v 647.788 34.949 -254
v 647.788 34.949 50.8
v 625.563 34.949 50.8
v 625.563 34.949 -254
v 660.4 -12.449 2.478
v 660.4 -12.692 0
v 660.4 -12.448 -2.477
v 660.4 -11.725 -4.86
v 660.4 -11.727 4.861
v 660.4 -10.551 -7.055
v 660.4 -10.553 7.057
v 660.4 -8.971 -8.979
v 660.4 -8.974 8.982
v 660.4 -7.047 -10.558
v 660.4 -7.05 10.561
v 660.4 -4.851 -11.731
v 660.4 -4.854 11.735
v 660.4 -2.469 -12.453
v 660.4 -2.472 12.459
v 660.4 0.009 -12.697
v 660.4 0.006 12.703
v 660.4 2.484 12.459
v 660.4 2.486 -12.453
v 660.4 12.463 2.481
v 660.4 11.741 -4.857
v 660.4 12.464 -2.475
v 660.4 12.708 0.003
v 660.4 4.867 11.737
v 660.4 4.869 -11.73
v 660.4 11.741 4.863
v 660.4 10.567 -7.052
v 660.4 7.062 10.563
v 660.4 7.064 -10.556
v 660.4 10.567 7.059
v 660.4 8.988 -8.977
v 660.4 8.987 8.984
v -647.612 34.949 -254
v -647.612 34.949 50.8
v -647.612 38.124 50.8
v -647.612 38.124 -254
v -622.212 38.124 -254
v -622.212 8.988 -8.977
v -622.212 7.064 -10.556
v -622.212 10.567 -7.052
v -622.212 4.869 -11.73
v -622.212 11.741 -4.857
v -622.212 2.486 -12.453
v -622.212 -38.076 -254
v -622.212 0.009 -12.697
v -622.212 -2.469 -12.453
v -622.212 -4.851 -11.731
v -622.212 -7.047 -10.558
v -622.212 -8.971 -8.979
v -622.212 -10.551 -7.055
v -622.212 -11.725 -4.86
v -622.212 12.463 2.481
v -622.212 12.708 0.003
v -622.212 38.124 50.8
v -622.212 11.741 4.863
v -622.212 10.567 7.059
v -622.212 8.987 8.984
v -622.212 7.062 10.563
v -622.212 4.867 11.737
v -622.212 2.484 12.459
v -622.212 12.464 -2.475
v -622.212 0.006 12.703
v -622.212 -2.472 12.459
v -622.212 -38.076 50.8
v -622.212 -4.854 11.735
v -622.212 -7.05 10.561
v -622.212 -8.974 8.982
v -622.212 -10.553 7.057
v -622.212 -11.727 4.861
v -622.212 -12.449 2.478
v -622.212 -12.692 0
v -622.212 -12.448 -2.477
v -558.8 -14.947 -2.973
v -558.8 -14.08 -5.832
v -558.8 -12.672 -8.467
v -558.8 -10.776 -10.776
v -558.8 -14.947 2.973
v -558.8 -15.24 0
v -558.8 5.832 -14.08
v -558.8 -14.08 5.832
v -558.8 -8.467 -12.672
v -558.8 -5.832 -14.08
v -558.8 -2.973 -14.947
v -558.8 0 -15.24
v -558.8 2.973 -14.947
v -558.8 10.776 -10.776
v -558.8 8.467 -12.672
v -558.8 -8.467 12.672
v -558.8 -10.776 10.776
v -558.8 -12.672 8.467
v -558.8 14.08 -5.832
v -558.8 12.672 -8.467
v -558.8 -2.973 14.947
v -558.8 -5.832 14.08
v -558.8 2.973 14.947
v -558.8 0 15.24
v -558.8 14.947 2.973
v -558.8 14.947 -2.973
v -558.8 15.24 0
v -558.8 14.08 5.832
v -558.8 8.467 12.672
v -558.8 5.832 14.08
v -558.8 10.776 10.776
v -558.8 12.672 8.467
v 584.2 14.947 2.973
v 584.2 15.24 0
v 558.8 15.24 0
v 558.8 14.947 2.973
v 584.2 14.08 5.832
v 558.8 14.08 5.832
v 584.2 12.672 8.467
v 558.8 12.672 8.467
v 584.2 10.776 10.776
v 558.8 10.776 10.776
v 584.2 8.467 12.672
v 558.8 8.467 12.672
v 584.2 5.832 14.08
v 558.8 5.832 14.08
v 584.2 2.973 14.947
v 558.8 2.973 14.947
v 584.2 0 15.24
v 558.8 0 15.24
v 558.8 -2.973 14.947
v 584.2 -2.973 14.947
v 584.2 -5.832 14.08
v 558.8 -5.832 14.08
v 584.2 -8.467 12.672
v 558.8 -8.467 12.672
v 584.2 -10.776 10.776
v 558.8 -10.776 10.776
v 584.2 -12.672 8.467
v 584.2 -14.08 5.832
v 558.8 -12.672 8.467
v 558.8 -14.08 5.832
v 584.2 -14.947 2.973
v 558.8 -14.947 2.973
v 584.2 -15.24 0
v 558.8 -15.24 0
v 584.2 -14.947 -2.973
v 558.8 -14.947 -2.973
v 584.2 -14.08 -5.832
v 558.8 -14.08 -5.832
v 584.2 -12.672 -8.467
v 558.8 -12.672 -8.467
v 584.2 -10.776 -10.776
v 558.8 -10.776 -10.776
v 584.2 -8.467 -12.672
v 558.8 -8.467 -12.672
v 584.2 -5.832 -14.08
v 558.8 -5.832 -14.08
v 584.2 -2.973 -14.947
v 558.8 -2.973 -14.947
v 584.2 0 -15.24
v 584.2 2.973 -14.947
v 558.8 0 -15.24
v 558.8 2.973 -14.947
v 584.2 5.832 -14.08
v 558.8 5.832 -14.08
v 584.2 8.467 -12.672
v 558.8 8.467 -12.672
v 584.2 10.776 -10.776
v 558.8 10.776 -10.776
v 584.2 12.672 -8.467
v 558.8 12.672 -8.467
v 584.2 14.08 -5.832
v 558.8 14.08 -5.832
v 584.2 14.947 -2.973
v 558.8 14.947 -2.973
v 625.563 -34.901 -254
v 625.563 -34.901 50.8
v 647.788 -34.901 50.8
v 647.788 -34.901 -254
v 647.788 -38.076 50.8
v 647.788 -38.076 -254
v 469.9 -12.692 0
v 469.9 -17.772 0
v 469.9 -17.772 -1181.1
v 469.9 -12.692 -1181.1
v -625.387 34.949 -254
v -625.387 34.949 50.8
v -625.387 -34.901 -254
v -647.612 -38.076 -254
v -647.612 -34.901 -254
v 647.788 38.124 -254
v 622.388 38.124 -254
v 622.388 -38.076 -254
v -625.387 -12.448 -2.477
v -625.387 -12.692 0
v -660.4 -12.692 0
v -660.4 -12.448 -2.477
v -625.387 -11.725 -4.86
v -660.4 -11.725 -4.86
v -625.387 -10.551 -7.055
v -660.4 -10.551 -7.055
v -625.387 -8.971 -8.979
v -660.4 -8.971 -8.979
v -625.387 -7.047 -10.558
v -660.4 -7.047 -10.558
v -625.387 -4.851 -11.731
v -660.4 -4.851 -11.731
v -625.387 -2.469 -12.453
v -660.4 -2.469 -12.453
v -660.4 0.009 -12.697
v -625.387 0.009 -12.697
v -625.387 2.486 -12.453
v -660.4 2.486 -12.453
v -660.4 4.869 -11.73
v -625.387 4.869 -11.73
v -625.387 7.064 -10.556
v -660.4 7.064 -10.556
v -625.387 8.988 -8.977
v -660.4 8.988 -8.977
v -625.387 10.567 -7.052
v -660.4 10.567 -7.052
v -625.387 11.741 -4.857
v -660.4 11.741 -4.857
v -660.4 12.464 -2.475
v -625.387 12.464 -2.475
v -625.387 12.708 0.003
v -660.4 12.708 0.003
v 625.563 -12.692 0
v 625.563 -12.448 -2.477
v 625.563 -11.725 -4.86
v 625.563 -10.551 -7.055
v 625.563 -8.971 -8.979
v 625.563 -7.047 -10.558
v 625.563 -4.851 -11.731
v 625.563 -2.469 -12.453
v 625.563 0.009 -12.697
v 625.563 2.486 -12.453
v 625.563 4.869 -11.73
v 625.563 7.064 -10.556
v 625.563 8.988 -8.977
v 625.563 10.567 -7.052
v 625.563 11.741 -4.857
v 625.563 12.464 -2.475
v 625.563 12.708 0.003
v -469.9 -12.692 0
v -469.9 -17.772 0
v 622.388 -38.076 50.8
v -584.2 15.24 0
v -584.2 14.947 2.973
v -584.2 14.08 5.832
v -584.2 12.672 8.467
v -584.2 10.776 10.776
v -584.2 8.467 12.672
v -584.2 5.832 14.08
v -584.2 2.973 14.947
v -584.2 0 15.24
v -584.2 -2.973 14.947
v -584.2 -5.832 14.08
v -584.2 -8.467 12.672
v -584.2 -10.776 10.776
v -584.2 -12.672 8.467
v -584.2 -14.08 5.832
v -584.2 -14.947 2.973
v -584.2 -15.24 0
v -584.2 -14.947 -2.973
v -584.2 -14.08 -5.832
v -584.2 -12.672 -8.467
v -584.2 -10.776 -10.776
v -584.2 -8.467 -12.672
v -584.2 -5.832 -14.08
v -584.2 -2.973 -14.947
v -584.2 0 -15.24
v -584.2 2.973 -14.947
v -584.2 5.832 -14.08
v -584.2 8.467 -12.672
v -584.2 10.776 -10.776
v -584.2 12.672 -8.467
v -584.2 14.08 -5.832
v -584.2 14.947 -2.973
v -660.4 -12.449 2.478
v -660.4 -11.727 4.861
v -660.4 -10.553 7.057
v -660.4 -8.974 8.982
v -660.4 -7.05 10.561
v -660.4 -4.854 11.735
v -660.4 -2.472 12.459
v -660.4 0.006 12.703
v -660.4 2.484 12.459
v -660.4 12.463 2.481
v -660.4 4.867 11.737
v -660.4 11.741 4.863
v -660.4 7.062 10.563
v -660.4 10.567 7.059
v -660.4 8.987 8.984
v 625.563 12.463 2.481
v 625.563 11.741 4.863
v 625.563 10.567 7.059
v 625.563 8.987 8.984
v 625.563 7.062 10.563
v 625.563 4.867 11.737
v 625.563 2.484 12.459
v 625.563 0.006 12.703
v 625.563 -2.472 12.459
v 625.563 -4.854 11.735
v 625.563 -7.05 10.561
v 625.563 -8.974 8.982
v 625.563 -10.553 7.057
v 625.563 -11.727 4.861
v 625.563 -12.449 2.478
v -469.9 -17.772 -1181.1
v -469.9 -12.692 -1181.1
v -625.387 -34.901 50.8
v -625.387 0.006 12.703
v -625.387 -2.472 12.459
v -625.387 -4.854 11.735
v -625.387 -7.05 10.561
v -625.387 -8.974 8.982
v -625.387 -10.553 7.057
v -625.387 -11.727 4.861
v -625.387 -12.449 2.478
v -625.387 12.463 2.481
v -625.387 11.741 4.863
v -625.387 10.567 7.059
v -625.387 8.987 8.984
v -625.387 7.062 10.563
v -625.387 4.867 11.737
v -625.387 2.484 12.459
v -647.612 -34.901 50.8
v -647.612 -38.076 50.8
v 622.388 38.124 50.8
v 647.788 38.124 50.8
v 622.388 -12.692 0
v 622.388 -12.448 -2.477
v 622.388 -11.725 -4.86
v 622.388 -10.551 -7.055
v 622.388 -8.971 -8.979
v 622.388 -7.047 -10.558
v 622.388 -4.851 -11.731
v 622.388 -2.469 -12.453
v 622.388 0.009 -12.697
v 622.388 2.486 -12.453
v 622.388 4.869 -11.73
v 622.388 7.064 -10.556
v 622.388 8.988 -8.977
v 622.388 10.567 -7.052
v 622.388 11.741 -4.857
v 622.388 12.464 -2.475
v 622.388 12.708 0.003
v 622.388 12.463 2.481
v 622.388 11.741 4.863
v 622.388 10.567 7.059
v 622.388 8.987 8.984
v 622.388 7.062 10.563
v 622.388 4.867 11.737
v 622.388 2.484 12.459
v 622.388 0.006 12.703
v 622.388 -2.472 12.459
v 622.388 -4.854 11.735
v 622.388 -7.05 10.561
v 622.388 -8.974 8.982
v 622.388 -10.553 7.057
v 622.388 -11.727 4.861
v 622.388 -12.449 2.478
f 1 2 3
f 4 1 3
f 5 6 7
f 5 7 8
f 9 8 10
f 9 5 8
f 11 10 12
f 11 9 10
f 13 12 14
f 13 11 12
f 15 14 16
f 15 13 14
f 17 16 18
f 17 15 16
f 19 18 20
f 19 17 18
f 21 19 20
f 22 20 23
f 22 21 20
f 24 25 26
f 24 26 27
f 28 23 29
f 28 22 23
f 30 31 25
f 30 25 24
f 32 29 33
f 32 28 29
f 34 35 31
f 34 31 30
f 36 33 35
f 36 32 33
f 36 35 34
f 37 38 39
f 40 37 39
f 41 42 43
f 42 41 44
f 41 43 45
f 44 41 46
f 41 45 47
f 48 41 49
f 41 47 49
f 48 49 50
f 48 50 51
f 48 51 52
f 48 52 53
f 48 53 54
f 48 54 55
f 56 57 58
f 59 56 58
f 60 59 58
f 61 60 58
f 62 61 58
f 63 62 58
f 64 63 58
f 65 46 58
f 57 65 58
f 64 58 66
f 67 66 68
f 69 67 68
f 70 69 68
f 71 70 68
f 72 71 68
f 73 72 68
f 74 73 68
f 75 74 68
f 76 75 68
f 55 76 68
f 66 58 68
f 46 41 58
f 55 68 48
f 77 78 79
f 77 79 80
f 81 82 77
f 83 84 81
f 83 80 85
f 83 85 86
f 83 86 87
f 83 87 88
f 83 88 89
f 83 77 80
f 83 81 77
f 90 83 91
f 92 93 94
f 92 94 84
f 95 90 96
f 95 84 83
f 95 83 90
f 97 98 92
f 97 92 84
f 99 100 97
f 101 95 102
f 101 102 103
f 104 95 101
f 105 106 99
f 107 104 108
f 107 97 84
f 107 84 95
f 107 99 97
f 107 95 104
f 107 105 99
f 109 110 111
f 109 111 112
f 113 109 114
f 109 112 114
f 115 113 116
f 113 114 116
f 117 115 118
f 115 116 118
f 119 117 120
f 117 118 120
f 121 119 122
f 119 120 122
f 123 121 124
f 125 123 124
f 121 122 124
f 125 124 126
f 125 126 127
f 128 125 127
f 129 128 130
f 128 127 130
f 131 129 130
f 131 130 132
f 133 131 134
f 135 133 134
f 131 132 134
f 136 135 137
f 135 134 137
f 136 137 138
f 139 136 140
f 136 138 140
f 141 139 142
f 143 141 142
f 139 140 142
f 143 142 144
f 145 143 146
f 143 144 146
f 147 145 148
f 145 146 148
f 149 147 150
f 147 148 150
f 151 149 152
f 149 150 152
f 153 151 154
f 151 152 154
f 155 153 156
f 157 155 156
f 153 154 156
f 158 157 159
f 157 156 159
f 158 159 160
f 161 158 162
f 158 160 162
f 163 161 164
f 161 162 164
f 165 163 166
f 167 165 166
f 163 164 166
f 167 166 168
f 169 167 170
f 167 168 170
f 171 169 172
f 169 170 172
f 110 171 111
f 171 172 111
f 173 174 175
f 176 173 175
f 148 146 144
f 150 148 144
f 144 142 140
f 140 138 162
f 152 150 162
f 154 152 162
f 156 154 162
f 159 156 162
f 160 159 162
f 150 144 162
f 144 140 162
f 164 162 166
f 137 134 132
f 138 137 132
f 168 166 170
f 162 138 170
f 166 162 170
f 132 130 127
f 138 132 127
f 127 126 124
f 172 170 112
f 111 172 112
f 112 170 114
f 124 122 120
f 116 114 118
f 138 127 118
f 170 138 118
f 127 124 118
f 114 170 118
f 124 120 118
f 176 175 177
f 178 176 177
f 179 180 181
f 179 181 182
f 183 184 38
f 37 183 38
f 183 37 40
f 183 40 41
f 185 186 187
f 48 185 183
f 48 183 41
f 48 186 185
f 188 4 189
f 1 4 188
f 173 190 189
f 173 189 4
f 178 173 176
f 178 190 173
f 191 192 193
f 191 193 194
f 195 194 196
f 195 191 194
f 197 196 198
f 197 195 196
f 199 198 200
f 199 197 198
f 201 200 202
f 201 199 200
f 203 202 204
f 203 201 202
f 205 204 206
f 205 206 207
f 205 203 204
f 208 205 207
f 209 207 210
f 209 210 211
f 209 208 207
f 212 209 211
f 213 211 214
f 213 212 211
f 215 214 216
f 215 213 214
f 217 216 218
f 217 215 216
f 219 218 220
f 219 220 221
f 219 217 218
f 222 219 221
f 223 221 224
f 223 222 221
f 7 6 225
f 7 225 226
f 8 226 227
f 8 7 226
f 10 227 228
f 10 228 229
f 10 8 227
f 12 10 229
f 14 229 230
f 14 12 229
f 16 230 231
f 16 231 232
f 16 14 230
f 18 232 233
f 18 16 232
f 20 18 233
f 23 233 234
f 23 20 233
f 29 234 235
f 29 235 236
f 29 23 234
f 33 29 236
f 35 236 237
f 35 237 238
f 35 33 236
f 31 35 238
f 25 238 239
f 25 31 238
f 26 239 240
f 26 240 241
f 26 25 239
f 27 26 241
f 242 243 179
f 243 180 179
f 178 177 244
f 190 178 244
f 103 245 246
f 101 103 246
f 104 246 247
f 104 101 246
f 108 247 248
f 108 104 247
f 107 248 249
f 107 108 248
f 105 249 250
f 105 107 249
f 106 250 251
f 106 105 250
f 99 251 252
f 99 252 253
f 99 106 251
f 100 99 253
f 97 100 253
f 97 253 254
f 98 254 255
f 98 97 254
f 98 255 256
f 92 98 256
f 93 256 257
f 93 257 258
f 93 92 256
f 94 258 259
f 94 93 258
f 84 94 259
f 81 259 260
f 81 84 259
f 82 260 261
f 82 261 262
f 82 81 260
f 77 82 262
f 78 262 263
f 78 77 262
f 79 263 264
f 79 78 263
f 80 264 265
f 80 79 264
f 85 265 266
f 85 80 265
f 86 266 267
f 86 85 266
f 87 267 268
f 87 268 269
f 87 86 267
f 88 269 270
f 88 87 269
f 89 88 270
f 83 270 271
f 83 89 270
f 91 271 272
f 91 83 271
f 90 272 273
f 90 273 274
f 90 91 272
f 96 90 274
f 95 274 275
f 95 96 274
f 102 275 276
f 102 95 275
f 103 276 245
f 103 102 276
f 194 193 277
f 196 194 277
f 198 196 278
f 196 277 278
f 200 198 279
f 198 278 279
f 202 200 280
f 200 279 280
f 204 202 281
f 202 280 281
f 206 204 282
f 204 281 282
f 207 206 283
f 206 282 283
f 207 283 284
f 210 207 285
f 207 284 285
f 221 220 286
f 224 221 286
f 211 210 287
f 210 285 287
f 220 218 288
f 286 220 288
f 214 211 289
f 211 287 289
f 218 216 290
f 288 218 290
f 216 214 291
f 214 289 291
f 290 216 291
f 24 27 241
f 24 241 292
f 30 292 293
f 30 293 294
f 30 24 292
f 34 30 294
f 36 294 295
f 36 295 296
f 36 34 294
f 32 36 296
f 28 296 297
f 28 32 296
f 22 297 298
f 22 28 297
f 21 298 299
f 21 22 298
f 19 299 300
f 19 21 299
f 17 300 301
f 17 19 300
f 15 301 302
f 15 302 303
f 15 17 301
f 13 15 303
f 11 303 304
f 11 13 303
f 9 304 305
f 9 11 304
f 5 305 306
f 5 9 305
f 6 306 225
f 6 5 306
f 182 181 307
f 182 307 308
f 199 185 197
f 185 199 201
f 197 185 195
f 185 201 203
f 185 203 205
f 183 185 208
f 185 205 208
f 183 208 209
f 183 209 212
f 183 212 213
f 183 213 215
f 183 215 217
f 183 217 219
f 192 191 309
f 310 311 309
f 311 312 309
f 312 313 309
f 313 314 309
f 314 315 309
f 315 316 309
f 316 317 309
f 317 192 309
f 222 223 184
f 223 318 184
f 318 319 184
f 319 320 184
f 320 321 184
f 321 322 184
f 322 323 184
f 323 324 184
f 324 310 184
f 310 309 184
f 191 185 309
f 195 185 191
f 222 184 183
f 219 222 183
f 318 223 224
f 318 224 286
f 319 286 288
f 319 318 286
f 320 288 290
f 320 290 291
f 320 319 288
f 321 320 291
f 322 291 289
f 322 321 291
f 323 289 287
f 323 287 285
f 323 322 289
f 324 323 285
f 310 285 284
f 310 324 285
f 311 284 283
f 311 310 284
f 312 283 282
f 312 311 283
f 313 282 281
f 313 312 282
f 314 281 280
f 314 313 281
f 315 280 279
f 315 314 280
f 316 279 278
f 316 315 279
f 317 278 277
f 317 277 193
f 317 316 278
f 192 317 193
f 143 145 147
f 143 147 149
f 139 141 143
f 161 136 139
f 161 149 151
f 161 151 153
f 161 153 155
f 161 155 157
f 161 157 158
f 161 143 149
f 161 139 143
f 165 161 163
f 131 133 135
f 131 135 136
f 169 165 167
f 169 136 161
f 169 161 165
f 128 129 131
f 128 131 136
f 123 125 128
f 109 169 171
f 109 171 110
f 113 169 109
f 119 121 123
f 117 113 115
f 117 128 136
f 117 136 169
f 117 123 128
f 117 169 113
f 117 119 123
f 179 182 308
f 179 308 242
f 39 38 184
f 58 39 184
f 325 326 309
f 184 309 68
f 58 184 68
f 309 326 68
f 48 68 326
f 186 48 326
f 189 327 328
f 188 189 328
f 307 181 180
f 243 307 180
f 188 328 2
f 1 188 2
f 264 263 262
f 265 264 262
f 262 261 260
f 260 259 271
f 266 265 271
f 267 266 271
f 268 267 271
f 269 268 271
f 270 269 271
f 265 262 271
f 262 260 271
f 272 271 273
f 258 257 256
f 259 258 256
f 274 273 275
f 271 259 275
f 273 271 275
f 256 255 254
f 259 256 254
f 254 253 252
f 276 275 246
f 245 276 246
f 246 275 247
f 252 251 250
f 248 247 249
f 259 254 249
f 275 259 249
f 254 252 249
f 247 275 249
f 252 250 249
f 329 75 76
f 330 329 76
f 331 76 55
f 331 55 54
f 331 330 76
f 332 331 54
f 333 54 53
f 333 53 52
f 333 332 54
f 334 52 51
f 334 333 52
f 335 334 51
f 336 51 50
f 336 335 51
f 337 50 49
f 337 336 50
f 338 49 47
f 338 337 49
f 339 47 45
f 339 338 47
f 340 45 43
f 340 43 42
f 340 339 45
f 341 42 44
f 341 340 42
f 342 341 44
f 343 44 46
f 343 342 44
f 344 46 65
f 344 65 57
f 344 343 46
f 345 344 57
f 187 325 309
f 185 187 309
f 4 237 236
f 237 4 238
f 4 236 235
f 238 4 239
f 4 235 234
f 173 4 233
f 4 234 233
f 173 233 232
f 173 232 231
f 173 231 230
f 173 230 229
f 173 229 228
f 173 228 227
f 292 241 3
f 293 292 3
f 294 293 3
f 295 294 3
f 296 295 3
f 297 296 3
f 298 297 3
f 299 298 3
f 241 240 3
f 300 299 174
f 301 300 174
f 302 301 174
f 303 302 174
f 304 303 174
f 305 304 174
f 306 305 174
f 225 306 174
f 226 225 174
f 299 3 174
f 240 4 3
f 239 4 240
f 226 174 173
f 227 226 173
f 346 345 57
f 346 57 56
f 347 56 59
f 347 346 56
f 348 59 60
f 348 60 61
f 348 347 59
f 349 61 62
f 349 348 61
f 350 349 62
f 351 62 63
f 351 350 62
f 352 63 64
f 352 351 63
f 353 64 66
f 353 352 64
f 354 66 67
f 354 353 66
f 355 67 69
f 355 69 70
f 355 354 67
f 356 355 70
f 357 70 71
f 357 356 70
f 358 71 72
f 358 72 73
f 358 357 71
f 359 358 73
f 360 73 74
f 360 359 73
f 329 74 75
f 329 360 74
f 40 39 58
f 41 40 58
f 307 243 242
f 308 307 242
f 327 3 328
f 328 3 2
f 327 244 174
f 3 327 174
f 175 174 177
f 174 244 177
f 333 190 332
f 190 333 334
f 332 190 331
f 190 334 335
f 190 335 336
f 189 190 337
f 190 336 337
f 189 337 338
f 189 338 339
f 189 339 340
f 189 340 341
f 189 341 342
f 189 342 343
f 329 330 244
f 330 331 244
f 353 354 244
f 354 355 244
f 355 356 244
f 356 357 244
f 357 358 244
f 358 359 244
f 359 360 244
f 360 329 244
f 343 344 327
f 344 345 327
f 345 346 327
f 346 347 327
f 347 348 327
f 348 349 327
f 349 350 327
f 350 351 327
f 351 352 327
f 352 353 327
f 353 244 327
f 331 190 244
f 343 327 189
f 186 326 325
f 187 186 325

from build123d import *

# Parameters (mm, degrees)
F1_DEPTH = 660.4
F0_W     = 5.08
F0_H     = 1181.1
F2_DEPTH = 469.9
F5_DEPTH = 304.8
F7_R     = 15.24
F8_DEPTH = 25.4


with BuildPart() as f1:
    # F0 (on Right) → F1 (new body, symmetric)
    with BuildSketch(Plane.YZ):
        with BuildLine():
            ThreePointArc((-12.692487, 0), (0.008975, -12.697076), (12.707513, 0.002924))
            ThreePointArc((12.707513, 0.002924), (0.00605, 12.702924), (-12.692487, 0))
        make_face()
    extrude(amount=F1_DEPTH, both=True)

    # F4 (on face) → F5 (join)
    with BuildSketch(Plane(origin=(0, 0, 50.8), x_dir=(1, 0, 0), z_dir=(0, 0, -1))):
        Polygon((-622.212201, -38.123938), (-622.212201, -0.023938), (-622.212201, 38.076062), (-647.612201, 38.076062), (-647.612201, 34.901062), (-625.387201, 34.901062), (-625.387201, -34.948938), (-647.612201, -34.948938), (-647.612201, -38.123938), align=None)
        Polygon((625.562799, 34.901062), (647.787799, 34.901062), (647.787799, 38.076062), (622.387799, 38.076062), (622.387799, -38.123938), (647.787799, -38.123938), (647.787799, -34.948938), (625.562799, -34.948938), align=None)
    extrude(amount=F5_DEPTH)


with BuildPart() as f2:
    # F0 (on Right) → F2 (new body, symmetric)
    with BuildSketch(Plane.YZ):
        with Locations((-15.232487, -590.55)):
            Rectangle(F0_W, F0_H)
    extrude(amount=F2_DEPTH, both=True)


with BuildPart() as f8:
    # F7 (on face) → F8 (new body)
    with BuildSketch(Plane.YZ.offset(558.8)):
        Circle(F7_R)
    extrude(amount=F8_DEPTH)


with BuildPart() as f9_1:
    # F9: instance of F8
    add(f8.part.mirror(Plane.YZ))


solid = Compound([f1.part, f2.part, f8.part, f9_1.part])
